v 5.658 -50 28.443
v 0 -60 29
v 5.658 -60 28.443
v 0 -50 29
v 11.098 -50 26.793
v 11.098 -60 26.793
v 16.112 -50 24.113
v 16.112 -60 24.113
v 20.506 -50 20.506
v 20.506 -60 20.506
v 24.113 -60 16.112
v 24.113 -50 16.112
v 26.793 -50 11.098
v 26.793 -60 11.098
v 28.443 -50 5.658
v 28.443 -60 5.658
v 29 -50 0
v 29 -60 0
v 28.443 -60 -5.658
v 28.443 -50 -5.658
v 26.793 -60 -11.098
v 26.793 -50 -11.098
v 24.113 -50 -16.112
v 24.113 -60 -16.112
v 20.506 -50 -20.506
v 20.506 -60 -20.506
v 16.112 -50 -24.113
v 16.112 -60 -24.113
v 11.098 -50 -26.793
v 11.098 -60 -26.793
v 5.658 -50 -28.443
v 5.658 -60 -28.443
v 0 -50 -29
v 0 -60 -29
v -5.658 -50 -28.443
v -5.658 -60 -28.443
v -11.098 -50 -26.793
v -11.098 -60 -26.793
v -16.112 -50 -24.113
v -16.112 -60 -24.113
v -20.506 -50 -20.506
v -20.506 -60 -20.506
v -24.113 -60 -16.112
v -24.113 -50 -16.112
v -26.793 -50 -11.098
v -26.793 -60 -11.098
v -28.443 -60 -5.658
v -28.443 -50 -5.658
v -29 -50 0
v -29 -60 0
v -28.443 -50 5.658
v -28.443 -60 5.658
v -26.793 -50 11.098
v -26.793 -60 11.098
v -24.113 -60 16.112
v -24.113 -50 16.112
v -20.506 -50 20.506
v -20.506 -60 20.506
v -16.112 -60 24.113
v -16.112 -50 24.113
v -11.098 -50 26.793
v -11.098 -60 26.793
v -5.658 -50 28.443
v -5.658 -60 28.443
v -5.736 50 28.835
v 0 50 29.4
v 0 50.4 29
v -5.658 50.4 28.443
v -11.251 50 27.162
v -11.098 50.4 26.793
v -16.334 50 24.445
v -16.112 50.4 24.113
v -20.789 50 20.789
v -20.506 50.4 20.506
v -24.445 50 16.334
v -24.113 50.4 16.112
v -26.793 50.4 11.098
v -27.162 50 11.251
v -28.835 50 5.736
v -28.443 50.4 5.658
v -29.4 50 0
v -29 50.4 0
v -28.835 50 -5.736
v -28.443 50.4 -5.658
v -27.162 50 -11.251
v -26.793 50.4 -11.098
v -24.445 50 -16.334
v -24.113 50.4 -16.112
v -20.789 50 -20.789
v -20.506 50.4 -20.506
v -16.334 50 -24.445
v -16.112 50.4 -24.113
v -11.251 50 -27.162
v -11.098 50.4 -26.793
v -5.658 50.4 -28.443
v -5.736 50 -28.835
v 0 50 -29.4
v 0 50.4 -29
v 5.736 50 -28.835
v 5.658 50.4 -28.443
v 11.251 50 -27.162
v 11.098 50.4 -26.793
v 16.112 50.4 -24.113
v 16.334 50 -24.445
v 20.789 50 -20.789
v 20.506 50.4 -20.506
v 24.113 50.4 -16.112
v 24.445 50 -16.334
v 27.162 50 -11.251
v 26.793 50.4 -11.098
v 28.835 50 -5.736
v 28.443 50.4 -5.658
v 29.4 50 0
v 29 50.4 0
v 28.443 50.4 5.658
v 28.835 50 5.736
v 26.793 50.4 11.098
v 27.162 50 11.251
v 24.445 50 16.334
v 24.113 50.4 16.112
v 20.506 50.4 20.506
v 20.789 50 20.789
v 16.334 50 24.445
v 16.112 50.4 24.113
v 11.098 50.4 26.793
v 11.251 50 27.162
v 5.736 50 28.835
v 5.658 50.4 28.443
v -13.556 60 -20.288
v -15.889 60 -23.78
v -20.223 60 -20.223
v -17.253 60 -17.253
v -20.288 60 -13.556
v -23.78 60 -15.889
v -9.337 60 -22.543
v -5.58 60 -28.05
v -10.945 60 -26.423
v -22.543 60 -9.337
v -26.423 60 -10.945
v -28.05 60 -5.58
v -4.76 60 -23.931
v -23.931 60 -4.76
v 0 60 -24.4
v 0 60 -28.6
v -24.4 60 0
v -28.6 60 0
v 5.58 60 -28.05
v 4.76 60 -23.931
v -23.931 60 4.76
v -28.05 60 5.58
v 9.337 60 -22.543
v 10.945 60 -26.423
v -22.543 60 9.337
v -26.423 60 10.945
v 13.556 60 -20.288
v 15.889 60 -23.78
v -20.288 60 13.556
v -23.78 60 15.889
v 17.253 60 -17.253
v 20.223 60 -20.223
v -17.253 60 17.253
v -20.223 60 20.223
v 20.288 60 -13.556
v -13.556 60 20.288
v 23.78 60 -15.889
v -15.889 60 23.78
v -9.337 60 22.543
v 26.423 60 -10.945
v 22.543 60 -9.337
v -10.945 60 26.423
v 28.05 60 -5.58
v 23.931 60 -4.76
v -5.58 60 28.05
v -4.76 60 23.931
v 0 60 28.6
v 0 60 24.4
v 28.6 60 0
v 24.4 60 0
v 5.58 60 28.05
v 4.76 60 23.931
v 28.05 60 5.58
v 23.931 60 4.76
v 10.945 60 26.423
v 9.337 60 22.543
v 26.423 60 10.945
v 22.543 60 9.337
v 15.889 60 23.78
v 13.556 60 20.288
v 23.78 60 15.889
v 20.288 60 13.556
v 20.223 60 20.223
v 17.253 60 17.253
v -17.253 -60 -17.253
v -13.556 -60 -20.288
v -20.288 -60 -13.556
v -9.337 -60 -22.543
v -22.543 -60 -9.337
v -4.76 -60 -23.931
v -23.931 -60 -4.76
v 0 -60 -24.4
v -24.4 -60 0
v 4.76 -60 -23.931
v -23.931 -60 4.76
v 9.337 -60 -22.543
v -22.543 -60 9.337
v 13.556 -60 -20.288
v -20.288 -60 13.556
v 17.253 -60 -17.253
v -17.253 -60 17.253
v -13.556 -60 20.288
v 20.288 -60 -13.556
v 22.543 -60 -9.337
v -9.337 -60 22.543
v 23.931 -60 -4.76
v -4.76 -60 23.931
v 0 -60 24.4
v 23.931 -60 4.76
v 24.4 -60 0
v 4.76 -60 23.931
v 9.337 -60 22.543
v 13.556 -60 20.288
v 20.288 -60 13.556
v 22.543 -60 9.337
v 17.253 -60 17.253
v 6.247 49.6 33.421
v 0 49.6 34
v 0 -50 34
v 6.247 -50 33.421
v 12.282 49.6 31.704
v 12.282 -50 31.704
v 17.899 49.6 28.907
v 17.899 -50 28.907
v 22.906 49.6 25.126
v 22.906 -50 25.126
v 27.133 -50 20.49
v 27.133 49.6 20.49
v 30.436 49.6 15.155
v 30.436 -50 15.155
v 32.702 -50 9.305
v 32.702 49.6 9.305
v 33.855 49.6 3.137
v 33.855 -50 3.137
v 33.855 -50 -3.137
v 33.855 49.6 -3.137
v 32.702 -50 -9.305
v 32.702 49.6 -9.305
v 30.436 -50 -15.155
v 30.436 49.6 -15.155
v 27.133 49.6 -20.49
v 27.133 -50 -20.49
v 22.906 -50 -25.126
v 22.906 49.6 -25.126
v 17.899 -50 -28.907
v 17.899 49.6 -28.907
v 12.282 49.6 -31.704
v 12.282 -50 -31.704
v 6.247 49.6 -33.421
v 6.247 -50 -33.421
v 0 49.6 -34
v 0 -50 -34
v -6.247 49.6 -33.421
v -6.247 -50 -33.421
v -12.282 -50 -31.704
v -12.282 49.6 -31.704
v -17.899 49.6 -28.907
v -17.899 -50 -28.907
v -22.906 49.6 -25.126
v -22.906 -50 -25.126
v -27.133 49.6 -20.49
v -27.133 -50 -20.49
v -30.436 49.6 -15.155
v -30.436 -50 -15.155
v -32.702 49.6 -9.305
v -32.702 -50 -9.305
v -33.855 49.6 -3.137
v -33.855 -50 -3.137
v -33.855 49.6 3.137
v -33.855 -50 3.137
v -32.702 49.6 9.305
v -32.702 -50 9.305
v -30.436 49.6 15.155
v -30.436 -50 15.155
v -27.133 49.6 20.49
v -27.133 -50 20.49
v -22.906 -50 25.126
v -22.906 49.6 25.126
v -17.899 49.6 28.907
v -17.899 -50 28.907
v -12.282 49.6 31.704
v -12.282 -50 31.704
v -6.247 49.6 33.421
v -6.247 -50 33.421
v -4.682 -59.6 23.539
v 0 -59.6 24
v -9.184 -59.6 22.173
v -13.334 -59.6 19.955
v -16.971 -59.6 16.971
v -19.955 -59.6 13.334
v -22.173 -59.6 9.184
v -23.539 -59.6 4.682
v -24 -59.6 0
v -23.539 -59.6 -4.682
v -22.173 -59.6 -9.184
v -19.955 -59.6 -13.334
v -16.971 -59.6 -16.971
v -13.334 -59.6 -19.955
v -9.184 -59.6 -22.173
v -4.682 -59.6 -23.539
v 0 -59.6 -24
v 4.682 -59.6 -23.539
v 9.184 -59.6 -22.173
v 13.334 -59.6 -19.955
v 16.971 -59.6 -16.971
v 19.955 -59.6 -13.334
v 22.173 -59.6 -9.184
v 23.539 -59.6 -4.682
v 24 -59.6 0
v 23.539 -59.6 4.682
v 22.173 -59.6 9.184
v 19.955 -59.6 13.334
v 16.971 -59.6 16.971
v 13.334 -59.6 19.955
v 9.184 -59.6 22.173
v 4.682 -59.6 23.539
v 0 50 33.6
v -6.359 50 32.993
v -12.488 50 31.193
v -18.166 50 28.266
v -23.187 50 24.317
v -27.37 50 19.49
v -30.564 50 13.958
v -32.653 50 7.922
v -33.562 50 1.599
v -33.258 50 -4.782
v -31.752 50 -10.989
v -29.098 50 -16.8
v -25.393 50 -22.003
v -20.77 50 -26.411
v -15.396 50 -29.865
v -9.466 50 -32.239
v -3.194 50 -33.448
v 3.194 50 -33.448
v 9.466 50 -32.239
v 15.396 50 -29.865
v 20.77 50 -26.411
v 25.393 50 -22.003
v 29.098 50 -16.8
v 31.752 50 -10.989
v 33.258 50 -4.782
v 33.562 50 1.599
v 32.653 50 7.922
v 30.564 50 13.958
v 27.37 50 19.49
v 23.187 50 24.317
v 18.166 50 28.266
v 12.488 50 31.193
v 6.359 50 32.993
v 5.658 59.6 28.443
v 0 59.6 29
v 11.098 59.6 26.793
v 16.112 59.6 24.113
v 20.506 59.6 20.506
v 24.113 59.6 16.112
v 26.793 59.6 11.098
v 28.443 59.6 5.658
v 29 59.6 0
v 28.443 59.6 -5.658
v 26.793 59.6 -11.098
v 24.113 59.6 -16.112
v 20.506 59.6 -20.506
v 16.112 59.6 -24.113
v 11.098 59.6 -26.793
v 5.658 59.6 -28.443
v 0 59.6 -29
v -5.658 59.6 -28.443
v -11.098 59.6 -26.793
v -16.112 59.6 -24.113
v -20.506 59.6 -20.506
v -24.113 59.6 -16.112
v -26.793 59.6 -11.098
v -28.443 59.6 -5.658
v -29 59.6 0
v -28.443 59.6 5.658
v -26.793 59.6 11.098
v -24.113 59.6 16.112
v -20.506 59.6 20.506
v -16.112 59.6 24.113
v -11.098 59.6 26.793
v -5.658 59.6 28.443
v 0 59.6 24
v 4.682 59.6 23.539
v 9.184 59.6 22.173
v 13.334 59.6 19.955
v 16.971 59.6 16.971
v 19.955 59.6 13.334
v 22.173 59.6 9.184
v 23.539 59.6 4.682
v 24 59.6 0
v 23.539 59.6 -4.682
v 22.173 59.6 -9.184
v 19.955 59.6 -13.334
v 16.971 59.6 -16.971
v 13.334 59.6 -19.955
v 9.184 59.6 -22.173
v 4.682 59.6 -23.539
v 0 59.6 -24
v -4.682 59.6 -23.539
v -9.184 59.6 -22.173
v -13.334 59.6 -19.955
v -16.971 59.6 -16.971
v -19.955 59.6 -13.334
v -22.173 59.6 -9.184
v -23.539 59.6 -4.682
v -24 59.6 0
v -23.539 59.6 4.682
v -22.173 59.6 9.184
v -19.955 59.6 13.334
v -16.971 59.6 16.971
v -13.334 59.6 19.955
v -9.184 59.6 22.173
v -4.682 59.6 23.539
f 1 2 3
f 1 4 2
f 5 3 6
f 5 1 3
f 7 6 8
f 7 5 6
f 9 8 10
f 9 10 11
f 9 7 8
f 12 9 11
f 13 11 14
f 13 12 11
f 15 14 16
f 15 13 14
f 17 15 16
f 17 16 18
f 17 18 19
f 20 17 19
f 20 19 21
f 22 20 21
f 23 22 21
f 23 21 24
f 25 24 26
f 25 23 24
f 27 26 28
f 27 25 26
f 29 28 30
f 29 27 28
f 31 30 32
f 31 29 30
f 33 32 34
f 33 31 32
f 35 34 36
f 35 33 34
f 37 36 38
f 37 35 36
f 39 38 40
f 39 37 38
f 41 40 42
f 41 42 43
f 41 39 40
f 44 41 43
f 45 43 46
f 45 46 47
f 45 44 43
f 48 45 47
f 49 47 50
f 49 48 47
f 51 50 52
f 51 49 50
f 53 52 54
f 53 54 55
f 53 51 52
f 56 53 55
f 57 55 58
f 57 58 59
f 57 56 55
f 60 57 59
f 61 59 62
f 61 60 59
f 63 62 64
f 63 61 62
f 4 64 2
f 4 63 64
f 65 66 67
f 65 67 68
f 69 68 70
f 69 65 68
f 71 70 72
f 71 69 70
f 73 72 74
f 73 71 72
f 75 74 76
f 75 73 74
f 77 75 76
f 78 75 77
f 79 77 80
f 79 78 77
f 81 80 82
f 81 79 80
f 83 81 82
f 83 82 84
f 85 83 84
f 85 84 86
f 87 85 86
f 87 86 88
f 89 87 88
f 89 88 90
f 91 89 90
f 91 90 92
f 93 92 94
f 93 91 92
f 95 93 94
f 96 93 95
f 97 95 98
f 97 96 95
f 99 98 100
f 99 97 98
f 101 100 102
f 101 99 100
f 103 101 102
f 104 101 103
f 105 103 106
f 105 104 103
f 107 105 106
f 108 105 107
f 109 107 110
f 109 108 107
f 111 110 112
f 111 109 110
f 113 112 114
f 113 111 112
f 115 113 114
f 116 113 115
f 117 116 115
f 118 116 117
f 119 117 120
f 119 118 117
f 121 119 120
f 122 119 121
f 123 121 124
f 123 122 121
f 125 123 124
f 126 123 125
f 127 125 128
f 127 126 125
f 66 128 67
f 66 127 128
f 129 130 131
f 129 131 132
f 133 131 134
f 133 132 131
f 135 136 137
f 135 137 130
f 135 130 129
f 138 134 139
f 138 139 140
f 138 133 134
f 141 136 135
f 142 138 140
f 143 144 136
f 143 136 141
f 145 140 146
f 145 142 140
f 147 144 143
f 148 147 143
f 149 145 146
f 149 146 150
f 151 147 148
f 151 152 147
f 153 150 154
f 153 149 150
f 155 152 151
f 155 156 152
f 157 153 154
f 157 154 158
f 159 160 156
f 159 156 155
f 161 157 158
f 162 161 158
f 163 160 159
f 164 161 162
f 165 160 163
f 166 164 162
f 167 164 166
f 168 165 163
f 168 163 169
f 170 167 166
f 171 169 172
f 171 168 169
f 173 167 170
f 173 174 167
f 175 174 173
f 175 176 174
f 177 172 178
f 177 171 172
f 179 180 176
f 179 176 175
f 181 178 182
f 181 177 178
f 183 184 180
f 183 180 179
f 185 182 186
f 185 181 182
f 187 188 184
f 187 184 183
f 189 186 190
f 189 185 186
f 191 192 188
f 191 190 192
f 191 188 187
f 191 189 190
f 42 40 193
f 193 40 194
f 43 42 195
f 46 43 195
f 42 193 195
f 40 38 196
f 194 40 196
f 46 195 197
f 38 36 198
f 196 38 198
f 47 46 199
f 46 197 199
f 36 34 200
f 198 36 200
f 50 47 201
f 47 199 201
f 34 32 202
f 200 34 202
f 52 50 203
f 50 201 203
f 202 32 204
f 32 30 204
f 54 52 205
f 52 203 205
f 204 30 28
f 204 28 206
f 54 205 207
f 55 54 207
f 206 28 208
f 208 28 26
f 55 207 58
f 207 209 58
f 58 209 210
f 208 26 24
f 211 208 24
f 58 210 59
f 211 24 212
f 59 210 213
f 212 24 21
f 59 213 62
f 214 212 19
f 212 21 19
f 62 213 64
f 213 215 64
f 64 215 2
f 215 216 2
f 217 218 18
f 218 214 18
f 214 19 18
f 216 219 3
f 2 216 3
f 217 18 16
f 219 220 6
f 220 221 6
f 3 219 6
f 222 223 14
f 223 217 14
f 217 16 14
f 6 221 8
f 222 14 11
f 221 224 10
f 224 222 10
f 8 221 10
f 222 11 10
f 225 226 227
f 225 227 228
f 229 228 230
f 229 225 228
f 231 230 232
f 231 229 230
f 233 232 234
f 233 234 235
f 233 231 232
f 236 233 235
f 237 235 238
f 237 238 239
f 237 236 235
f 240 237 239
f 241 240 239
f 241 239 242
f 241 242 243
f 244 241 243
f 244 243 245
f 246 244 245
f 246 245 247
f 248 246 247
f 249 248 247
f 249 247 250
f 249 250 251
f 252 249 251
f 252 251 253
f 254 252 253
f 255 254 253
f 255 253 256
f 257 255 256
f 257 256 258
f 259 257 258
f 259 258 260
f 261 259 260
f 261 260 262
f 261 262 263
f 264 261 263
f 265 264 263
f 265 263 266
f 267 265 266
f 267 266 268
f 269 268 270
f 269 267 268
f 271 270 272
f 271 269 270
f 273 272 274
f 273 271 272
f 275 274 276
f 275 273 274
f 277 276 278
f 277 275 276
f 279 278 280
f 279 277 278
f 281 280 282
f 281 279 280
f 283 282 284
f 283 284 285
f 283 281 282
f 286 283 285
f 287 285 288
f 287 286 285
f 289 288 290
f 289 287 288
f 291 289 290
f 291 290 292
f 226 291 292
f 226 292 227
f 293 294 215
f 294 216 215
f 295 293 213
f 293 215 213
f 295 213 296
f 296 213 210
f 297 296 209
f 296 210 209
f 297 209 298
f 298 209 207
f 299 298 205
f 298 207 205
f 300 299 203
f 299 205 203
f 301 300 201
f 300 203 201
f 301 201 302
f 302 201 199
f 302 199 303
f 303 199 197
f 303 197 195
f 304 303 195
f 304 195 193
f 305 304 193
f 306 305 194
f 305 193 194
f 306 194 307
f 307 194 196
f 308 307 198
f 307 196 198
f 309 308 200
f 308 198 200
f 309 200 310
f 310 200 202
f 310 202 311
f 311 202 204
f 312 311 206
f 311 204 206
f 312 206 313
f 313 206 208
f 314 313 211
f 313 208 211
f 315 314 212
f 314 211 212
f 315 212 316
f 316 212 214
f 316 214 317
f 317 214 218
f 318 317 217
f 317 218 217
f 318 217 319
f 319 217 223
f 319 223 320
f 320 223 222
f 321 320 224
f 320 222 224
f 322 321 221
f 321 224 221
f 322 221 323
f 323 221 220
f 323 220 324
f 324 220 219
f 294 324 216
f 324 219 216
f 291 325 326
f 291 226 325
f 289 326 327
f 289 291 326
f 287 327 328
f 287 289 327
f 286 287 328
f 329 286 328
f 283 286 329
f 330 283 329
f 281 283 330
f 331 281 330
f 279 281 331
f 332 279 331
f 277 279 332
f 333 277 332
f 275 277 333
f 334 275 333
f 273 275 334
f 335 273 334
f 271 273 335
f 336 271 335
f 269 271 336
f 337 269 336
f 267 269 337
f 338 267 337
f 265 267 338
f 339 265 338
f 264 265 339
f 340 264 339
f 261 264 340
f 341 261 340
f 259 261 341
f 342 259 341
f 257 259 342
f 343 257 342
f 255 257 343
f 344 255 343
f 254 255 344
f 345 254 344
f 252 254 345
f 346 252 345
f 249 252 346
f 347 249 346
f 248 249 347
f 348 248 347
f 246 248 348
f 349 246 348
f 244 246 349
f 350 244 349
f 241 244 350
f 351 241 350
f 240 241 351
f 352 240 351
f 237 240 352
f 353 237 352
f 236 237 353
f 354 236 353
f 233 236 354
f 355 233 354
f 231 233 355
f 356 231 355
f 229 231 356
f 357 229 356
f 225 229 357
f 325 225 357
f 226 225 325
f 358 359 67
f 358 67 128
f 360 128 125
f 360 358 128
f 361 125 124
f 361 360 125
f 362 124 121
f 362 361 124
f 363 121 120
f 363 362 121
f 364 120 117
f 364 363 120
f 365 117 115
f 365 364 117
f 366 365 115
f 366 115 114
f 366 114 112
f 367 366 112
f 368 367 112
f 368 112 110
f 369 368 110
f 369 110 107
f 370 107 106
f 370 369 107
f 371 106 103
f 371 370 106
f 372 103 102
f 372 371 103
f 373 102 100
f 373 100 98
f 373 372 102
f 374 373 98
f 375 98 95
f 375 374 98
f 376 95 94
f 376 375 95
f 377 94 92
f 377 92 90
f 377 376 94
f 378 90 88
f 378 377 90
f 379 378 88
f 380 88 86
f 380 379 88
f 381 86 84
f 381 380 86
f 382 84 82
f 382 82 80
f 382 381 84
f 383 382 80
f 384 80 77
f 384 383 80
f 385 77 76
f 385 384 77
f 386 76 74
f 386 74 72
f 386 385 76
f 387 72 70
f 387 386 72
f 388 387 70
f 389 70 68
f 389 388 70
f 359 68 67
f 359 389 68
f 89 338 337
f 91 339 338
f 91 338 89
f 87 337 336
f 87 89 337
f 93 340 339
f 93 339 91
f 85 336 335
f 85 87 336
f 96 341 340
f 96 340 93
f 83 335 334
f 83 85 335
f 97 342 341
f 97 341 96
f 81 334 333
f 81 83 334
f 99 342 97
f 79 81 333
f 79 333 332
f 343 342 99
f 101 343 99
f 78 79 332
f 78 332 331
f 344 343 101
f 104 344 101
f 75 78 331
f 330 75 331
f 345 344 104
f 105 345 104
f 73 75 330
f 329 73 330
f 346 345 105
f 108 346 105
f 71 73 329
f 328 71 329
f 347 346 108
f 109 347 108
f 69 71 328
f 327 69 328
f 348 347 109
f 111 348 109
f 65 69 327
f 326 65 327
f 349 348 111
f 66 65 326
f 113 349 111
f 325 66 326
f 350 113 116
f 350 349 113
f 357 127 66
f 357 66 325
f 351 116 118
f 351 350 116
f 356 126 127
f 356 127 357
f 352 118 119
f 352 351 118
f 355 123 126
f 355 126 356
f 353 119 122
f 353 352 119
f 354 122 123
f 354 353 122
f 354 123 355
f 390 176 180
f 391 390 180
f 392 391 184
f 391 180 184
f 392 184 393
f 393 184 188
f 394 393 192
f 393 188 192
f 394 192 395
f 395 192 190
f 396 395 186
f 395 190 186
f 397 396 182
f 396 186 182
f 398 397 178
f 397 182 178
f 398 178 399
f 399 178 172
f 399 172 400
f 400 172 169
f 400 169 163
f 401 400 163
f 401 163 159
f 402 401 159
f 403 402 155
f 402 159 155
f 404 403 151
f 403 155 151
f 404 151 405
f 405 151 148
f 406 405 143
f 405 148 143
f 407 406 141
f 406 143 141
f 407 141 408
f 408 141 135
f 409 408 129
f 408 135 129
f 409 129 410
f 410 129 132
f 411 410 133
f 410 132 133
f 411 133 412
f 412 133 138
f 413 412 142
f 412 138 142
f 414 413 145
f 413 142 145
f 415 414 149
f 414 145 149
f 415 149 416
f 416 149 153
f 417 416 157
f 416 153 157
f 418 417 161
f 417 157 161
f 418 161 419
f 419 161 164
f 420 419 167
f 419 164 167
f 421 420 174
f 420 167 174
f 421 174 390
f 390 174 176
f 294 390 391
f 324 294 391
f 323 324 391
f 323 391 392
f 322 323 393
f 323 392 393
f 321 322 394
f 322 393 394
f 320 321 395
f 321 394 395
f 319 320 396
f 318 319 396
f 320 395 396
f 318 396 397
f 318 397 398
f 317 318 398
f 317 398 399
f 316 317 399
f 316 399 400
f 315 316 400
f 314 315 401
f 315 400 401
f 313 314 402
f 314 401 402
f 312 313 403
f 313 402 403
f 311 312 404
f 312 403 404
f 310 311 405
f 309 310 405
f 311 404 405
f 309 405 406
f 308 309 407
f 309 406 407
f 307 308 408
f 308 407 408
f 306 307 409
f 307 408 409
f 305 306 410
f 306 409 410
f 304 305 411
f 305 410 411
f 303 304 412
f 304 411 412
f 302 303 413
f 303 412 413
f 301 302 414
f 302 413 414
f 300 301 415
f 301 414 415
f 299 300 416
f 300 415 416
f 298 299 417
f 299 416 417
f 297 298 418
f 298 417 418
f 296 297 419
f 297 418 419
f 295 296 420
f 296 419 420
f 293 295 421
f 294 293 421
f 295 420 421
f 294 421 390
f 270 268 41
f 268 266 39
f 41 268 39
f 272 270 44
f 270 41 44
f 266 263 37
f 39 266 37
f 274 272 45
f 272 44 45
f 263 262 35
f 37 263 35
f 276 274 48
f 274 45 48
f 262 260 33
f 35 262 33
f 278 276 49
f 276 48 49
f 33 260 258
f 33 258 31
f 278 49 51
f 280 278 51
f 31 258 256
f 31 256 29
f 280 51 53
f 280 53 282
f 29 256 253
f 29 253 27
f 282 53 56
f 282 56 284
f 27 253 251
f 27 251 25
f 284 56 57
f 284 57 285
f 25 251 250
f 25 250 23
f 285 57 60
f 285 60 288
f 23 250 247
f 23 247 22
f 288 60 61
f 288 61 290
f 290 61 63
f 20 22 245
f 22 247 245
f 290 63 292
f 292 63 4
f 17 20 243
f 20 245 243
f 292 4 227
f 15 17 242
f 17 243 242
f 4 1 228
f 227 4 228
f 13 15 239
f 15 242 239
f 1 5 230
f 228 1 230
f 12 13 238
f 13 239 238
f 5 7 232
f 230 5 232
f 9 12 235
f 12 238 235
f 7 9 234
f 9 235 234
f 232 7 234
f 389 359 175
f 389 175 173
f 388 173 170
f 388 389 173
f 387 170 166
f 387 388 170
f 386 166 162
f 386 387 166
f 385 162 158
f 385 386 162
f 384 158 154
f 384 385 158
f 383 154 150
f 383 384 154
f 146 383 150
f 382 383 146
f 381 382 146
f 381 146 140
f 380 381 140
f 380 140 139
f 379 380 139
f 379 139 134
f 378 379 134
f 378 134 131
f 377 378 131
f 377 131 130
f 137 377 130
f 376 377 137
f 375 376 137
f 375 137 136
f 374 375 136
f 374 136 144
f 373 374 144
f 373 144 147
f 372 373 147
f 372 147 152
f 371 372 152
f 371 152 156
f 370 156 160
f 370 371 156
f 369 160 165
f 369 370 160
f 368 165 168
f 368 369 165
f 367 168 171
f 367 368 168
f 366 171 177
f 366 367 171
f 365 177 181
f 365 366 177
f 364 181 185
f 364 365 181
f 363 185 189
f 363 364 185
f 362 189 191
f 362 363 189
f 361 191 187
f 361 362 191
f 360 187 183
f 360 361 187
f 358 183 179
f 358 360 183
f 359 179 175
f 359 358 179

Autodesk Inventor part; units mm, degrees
ref_plane "YZ Plane" through (0, 0, 0) normal (1, 0, 0) x (0, 1, 0)
ref_plane "XZ Plane" through (0, 0, 0) normal (0, 1, 0) x (-1, 0, 0)
ref_plane "XY Plane" through (0, 0, 0) normal (0, 0, 1) x (1, 0, 0)
sketch "スケッチ1" plane through (0, 0, 0) normal (1, 0, 0) x (0, 1, 0)
  line L0 (-60, 29) -> (-50, 29)
  line L1 (-50, 29) -> (-50, 34)
  line L2 (-50, 34) -> (50, 34)
  line L3 (50, 34) -> (50, 29)
  line L4 (50, 29) -> (60, 29)
  line L5 (-60, 29) -> (-60, 24)
  line L6 (-60, 24) -> (60, 24)
  line L7 (-60, 0) -> (60, 0)
  line L8 (60, 29) -> (60, 24)
  point P0 (0, 0)
  point P1 (0, 0)
  dimension "d3" = 100
  dimension "d17" = 120
  dimension "d18" = 68
  dimension "d19" = 58
  dimension "d20" = 48
revolve "回転1" add sketch "スケッチ1" angle 360 about axis through (0, -60, 0) along (0, 1, 0)
chamfer "Chamfer1" distance 0.4 angle 45 5 edges at (0, -60, -24) (0, 60, -24) (0, 60, -29) (0, 50, -29) (0, 50, -34)
properties part number "chamber_nipple03" material "ABS Plastic"
